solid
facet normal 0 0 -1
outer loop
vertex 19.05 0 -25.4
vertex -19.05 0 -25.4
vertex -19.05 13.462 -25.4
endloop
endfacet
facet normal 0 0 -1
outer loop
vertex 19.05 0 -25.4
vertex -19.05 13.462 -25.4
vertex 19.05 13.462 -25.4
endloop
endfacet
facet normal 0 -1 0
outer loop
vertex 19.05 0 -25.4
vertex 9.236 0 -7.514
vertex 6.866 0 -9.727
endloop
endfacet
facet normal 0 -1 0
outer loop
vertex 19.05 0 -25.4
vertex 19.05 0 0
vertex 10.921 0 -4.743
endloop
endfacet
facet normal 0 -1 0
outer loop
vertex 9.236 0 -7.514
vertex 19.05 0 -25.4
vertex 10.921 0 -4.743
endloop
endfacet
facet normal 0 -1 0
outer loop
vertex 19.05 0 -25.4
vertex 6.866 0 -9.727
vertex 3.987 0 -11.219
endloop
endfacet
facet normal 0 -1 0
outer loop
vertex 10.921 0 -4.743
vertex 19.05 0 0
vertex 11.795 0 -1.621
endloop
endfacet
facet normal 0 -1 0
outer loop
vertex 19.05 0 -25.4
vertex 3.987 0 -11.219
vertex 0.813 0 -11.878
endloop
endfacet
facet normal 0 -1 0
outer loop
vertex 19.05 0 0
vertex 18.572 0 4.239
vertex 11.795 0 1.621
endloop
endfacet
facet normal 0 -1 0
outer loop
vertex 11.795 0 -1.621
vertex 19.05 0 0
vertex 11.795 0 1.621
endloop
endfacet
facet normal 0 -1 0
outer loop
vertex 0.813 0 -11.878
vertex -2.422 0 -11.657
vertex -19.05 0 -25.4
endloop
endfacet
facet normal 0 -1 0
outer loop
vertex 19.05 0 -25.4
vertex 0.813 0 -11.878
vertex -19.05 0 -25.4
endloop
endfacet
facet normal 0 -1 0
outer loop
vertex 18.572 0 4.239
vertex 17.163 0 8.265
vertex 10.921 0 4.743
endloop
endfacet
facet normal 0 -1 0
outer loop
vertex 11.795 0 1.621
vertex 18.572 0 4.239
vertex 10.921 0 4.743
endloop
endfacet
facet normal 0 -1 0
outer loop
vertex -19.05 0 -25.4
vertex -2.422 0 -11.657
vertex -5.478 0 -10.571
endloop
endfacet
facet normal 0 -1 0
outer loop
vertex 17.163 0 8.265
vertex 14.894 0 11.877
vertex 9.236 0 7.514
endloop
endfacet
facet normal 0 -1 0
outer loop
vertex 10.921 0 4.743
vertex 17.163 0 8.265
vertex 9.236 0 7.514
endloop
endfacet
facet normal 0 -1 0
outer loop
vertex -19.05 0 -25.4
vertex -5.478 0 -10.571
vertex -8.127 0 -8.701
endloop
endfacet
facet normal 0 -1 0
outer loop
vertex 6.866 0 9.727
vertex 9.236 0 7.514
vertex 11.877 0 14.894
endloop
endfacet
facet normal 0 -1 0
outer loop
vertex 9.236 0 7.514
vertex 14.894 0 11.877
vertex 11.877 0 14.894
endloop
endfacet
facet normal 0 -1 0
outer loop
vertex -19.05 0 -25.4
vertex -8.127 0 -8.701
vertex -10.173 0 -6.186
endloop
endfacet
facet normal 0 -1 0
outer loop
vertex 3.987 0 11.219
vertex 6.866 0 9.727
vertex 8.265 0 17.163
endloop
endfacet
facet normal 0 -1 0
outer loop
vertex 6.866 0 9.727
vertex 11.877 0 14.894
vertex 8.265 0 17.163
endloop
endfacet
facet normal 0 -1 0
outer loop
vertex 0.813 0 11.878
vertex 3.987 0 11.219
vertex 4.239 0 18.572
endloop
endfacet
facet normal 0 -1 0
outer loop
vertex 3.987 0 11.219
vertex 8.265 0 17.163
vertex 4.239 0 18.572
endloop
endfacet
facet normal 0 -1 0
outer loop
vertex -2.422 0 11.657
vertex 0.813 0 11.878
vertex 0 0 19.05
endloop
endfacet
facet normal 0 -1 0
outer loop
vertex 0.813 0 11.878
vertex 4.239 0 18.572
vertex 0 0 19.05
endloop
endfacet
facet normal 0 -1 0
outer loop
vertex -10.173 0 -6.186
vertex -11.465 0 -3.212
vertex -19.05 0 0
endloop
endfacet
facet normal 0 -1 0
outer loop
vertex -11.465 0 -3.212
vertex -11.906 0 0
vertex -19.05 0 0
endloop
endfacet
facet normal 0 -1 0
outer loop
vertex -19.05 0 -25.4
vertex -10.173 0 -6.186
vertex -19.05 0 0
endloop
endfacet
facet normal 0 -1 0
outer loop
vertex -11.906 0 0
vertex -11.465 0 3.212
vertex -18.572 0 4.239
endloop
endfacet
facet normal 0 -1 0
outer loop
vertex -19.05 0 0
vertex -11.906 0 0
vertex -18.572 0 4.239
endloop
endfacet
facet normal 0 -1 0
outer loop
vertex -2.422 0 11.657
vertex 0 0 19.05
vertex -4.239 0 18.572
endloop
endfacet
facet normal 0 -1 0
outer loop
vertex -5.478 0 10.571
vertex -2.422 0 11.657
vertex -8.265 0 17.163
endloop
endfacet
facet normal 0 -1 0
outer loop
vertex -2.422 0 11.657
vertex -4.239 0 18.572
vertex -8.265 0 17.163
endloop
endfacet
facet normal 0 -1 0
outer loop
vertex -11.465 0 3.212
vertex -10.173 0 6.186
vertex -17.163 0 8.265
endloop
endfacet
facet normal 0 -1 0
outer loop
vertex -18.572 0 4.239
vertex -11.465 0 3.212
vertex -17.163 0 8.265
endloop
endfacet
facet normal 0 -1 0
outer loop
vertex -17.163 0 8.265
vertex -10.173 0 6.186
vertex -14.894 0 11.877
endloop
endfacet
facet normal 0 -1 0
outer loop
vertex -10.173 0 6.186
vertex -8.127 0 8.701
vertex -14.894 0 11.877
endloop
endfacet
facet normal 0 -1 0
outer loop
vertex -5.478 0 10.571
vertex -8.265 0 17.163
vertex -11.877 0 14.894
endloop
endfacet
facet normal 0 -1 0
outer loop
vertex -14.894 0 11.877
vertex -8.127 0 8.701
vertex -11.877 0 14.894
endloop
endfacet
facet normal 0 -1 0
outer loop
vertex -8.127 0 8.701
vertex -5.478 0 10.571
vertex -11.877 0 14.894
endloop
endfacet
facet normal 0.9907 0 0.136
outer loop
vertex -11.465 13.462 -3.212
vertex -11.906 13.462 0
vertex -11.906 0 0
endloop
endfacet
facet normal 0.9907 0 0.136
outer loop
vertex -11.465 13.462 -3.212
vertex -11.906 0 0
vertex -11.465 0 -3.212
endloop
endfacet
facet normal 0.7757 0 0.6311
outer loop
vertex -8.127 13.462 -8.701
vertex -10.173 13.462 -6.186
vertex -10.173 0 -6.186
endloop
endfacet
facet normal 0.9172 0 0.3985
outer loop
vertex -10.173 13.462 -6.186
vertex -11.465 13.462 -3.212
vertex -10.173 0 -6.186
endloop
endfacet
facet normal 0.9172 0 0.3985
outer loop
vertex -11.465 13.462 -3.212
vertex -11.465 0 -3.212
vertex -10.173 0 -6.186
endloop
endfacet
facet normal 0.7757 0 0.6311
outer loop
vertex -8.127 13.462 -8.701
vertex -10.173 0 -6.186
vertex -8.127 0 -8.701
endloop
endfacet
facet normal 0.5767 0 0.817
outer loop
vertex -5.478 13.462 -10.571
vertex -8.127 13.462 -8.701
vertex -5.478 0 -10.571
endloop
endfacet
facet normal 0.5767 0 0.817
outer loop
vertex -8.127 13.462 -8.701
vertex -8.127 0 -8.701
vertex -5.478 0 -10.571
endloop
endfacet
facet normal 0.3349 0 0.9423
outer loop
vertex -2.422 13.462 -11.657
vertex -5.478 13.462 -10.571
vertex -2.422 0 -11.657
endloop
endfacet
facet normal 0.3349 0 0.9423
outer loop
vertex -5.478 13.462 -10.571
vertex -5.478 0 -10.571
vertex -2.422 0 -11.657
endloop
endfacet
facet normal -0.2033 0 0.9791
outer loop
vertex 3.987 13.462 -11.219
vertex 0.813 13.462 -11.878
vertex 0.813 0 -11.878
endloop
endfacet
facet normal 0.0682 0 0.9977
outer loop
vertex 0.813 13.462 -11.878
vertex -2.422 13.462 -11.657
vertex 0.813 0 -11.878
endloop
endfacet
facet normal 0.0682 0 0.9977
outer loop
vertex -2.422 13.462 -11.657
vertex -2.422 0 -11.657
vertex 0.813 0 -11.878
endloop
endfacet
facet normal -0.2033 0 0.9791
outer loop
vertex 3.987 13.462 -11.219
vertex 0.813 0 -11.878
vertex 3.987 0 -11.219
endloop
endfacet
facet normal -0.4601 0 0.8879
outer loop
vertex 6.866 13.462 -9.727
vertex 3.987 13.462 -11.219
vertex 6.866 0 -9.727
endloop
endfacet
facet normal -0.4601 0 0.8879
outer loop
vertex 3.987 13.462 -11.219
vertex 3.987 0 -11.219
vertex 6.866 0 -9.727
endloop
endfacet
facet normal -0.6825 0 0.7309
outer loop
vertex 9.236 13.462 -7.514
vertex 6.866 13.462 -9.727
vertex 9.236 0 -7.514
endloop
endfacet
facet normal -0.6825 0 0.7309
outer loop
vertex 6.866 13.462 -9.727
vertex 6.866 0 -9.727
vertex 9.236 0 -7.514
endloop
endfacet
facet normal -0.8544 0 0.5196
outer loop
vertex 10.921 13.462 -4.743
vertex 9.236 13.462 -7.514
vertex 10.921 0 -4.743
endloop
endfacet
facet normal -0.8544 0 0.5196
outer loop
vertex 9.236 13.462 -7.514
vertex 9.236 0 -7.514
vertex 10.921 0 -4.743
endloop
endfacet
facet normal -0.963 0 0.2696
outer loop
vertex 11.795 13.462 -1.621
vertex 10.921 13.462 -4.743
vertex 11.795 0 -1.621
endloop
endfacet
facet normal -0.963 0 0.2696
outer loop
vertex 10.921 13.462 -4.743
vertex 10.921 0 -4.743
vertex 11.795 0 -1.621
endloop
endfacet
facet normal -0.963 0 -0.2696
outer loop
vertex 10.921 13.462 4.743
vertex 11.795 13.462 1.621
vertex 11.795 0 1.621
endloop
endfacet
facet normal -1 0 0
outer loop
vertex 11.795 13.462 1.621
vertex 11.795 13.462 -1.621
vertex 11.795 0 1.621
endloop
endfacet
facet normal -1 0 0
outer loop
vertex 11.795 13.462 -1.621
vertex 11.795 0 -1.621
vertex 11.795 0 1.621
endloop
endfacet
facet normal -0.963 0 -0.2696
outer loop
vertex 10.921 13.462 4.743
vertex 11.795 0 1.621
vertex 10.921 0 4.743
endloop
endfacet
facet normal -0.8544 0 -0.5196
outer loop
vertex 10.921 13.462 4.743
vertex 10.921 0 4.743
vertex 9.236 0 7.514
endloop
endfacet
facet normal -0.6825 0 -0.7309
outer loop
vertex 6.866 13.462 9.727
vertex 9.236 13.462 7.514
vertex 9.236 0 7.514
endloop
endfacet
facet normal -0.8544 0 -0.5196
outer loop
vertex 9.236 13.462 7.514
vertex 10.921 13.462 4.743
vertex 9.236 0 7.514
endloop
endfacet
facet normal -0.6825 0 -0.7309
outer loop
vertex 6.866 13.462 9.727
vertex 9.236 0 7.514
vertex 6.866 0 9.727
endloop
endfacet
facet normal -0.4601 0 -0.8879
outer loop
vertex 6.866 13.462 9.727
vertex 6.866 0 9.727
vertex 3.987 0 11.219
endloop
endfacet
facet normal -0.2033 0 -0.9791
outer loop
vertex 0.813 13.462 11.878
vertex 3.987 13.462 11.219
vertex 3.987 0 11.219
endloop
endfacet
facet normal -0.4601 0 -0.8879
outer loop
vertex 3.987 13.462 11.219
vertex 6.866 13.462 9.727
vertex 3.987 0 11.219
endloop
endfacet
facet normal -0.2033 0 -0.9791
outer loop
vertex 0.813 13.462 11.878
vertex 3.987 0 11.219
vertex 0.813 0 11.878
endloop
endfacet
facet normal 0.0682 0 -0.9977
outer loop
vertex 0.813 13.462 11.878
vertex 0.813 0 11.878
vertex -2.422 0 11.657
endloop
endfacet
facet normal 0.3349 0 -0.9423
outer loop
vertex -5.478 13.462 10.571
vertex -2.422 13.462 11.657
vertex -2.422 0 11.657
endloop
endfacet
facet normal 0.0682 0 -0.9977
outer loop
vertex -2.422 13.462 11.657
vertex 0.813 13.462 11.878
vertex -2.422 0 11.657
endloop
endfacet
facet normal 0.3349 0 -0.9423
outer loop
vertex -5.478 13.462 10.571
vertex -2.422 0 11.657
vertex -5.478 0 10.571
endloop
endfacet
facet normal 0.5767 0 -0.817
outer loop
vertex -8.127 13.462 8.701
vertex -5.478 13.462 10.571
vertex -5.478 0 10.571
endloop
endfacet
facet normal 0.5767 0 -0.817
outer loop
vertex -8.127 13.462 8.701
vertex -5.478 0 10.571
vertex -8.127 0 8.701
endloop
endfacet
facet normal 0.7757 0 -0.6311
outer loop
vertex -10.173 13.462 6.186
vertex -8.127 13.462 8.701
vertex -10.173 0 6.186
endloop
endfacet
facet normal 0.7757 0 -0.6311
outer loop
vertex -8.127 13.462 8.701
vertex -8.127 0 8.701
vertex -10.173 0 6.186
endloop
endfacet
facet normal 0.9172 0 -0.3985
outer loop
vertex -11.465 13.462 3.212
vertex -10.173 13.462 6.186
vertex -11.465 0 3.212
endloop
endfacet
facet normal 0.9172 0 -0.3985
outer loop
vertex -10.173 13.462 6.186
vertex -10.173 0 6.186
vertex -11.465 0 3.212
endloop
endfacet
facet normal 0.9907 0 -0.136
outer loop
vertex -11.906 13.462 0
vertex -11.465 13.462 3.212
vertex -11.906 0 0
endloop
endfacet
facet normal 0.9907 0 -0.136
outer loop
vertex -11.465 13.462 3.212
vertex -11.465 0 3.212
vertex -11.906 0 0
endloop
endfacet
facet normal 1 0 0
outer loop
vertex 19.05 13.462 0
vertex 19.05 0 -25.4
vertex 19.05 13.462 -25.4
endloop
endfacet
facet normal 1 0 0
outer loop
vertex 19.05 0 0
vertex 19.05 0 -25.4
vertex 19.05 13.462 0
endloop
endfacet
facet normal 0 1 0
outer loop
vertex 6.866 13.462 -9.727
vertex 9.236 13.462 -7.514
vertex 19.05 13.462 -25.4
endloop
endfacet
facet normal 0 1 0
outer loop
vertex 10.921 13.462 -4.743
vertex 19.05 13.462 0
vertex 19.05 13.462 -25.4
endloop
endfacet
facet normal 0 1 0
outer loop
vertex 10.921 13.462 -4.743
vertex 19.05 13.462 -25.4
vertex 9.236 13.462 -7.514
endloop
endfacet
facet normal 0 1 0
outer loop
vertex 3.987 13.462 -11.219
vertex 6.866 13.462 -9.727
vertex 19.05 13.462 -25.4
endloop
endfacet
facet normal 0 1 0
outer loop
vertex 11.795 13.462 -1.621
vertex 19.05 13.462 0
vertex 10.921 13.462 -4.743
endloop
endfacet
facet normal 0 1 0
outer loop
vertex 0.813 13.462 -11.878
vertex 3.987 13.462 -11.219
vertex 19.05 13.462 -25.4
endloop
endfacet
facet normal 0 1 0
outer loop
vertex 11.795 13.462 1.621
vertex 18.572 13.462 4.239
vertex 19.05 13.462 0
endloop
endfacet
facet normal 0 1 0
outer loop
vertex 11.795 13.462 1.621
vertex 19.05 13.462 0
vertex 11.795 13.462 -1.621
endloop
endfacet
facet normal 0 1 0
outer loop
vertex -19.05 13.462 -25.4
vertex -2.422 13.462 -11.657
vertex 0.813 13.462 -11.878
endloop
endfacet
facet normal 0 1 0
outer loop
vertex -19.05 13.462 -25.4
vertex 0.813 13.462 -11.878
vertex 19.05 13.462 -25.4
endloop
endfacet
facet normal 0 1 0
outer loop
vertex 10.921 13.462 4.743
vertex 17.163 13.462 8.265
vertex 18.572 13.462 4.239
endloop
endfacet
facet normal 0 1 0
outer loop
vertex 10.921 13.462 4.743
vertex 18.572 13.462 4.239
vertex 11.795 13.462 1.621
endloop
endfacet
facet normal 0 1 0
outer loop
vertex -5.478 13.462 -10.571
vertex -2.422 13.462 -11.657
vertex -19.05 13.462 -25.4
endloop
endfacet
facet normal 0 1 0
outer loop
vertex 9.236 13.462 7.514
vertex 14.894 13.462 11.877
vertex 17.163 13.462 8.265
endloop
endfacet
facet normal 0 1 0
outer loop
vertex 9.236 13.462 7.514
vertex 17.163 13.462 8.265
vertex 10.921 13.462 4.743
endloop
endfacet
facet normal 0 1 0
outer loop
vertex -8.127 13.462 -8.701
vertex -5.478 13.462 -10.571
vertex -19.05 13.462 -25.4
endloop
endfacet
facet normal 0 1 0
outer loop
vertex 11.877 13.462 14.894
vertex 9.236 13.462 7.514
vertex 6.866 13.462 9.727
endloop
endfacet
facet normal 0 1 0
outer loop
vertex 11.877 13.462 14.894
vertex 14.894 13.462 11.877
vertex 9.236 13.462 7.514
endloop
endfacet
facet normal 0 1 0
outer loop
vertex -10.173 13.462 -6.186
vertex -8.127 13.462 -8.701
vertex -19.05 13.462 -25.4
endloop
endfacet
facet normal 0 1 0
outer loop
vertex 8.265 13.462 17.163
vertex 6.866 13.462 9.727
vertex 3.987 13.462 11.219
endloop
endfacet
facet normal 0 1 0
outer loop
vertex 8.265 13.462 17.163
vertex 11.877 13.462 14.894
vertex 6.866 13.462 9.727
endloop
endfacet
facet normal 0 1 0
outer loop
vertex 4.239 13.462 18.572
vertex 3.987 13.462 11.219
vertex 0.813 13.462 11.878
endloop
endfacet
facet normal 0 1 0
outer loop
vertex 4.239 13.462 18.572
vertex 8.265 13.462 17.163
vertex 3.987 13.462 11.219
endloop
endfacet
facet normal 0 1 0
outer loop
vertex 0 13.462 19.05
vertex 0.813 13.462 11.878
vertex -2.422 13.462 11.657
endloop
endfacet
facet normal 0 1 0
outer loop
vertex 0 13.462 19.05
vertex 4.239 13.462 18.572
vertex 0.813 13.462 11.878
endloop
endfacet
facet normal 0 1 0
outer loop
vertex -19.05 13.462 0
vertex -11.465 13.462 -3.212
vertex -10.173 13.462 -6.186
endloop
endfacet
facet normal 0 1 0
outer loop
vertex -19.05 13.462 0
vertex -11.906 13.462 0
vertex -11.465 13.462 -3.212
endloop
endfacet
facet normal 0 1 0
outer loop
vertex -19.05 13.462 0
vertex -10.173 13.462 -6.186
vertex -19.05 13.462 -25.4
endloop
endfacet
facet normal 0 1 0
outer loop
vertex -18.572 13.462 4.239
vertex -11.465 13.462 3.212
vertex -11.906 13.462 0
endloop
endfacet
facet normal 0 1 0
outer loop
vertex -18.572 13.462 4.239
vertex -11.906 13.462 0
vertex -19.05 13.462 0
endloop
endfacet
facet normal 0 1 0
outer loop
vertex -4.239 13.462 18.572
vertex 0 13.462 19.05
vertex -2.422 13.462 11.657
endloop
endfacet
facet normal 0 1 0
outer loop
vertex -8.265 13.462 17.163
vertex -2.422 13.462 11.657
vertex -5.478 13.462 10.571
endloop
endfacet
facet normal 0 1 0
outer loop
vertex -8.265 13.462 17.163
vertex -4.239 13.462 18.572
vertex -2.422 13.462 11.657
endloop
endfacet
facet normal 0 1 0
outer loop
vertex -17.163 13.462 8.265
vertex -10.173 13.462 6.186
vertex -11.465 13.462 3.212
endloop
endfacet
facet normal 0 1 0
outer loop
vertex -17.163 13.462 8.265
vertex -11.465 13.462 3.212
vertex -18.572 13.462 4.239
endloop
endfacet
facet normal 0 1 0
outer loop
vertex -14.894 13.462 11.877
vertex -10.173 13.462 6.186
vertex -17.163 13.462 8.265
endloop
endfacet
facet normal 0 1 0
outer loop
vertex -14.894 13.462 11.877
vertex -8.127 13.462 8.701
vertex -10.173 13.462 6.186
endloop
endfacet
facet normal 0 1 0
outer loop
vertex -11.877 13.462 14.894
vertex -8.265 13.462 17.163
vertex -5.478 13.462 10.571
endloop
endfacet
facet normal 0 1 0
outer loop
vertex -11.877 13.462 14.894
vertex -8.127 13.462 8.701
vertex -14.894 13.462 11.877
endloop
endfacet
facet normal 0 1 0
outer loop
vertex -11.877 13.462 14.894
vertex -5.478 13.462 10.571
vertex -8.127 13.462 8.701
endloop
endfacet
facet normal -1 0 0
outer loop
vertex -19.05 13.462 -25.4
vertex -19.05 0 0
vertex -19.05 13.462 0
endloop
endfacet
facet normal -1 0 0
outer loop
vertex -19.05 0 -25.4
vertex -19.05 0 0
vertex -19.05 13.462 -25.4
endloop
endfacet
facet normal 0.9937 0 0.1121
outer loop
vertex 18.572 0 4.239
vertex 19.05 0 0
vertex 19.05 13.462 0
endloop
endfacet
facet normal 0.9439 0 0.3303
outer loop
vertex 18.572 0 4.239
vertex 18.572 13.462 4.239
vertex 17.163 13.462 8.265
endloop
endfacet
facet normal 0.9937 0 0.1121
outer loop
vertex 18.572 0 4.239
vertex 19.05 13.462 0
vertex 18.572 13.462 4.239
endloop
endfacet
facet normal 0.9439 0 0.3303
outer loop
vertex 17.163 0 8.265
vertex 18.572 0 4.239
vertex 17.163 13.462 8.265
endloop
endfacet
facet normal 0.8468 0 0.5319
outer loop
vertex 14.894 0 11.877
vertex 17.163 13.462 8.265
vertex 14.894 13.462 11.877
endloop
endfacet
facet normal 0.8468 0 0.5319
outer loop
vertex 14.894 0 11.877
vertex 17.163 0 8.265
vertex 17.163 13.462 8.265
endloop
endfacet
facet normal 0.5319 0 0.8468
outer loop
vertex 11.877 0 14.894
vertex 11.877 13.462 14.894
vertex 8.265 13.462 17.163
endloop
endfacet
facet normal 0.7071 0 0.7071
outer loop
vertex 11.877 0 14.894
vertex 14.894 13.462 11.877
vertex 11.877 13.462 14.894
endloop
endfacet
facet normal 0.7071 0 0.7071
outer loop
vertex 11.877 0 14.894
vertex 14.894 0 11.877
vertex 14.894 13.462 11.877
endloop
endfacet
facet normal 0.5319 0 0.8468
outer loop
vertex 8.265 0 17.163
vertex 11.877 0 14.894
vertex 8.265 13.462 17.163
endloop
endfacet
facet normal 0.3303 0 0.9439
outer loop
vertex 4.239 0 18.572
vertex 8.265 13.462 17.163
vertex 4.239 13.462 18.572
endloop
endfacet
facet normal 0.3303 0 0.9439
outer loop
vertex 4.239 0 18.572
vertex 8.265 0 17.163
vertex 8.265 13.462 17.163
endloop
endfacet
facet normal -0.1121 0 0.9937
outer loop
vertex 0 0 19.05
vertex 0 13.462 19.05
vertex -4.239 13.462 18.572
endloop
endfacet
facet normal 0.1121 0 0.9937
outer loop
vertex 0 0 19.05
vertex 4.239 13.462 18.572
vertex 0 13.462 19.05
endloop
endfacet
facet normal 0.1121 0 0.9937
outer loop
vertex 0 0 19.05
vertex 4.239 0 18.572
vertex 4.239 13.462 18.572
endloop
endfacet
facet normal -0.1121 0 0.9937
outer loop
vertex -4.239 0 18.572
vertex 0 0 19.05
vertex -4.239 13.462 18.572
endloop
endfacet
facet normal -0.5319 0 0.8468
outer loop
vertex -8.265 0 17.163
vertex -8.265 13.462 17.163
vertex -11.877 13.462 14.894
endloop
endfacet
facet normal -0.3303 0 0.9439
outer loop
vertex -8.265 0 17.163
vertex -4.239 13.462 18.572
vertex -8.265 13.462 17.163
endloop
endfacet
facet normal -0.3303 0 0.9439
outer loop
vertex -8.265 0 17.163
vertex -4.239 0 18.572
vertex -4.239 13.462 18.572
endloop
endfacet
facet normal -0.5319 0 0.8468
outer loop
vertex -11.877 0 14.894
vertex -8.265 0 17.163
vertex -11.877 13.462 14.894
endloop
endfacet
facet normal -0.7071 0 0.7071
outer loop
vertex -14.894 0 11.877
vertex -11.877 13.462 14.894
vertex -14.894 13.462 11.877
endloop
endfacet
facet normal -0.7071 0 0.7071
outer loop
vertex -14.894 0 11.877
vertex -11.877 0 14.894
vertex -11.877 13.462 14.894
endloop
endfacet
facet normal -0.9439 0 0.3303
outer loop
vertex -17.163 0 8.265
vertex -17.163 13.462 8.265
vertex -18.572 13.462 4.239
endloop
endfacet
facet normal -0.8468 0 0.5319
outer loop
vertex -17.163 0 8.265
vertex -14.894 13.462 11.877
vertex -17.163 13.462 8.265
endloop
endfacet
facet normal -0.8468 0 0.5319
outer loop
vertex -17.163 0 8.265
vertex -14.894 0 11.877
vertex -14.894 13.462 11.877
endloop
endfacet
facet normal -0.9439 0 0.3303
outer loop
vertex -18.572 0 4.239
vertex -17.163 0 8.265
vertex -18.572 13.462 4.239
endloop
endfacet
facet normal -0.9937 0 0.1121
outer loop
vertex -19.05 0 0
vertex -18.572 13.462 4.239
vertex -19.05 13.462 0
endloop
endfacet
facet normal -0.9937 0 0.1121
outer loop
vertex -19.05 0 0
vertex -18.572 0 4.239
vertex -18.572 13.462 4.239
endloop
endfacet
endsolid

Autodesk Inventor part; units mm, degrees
ref_plane "YZ Plane" through (0, 0, 0) normal (1, 0, 0) x (0, 1, 0)
ref_plane "XZ Plane" through (0, 0, 0) normal (0, 1, 0) x (-1, 0, 0)
ref_plane "XY Plane" through (0, 0, 0) normal (0, 0, 1) x (1, 0, 0)
sketch "Sketch1" plane through (0, 0, 0) normal (0, 1, 0) x (-1, 0, 0)
  circle A0 centre (0, 0) radius 11.9062
  arc A1 (19.05, 0) -> (-19.05, 0) centre (0, 0) ccw
  line L0 (19.05, 0) -> (19.05, -25.4)
  line L1 (19.05, -25.4) -> (-19.05, -25.4)
  line L2 (-19.05, -25.4) -> (-19.05, 0)
  dimension "d0" = 23.8125
  dimension "d2" = 38.1
  dimension "d16" = 25.4
extrude "Extrusion1" add sketch "Sketch1" along normal blind 13.462
thread "Thread1" size "15/16-16 UN" class "2B" standard "ANSI Unified Screw Threads" full length
properties part number "AcmeMountingFlange"
